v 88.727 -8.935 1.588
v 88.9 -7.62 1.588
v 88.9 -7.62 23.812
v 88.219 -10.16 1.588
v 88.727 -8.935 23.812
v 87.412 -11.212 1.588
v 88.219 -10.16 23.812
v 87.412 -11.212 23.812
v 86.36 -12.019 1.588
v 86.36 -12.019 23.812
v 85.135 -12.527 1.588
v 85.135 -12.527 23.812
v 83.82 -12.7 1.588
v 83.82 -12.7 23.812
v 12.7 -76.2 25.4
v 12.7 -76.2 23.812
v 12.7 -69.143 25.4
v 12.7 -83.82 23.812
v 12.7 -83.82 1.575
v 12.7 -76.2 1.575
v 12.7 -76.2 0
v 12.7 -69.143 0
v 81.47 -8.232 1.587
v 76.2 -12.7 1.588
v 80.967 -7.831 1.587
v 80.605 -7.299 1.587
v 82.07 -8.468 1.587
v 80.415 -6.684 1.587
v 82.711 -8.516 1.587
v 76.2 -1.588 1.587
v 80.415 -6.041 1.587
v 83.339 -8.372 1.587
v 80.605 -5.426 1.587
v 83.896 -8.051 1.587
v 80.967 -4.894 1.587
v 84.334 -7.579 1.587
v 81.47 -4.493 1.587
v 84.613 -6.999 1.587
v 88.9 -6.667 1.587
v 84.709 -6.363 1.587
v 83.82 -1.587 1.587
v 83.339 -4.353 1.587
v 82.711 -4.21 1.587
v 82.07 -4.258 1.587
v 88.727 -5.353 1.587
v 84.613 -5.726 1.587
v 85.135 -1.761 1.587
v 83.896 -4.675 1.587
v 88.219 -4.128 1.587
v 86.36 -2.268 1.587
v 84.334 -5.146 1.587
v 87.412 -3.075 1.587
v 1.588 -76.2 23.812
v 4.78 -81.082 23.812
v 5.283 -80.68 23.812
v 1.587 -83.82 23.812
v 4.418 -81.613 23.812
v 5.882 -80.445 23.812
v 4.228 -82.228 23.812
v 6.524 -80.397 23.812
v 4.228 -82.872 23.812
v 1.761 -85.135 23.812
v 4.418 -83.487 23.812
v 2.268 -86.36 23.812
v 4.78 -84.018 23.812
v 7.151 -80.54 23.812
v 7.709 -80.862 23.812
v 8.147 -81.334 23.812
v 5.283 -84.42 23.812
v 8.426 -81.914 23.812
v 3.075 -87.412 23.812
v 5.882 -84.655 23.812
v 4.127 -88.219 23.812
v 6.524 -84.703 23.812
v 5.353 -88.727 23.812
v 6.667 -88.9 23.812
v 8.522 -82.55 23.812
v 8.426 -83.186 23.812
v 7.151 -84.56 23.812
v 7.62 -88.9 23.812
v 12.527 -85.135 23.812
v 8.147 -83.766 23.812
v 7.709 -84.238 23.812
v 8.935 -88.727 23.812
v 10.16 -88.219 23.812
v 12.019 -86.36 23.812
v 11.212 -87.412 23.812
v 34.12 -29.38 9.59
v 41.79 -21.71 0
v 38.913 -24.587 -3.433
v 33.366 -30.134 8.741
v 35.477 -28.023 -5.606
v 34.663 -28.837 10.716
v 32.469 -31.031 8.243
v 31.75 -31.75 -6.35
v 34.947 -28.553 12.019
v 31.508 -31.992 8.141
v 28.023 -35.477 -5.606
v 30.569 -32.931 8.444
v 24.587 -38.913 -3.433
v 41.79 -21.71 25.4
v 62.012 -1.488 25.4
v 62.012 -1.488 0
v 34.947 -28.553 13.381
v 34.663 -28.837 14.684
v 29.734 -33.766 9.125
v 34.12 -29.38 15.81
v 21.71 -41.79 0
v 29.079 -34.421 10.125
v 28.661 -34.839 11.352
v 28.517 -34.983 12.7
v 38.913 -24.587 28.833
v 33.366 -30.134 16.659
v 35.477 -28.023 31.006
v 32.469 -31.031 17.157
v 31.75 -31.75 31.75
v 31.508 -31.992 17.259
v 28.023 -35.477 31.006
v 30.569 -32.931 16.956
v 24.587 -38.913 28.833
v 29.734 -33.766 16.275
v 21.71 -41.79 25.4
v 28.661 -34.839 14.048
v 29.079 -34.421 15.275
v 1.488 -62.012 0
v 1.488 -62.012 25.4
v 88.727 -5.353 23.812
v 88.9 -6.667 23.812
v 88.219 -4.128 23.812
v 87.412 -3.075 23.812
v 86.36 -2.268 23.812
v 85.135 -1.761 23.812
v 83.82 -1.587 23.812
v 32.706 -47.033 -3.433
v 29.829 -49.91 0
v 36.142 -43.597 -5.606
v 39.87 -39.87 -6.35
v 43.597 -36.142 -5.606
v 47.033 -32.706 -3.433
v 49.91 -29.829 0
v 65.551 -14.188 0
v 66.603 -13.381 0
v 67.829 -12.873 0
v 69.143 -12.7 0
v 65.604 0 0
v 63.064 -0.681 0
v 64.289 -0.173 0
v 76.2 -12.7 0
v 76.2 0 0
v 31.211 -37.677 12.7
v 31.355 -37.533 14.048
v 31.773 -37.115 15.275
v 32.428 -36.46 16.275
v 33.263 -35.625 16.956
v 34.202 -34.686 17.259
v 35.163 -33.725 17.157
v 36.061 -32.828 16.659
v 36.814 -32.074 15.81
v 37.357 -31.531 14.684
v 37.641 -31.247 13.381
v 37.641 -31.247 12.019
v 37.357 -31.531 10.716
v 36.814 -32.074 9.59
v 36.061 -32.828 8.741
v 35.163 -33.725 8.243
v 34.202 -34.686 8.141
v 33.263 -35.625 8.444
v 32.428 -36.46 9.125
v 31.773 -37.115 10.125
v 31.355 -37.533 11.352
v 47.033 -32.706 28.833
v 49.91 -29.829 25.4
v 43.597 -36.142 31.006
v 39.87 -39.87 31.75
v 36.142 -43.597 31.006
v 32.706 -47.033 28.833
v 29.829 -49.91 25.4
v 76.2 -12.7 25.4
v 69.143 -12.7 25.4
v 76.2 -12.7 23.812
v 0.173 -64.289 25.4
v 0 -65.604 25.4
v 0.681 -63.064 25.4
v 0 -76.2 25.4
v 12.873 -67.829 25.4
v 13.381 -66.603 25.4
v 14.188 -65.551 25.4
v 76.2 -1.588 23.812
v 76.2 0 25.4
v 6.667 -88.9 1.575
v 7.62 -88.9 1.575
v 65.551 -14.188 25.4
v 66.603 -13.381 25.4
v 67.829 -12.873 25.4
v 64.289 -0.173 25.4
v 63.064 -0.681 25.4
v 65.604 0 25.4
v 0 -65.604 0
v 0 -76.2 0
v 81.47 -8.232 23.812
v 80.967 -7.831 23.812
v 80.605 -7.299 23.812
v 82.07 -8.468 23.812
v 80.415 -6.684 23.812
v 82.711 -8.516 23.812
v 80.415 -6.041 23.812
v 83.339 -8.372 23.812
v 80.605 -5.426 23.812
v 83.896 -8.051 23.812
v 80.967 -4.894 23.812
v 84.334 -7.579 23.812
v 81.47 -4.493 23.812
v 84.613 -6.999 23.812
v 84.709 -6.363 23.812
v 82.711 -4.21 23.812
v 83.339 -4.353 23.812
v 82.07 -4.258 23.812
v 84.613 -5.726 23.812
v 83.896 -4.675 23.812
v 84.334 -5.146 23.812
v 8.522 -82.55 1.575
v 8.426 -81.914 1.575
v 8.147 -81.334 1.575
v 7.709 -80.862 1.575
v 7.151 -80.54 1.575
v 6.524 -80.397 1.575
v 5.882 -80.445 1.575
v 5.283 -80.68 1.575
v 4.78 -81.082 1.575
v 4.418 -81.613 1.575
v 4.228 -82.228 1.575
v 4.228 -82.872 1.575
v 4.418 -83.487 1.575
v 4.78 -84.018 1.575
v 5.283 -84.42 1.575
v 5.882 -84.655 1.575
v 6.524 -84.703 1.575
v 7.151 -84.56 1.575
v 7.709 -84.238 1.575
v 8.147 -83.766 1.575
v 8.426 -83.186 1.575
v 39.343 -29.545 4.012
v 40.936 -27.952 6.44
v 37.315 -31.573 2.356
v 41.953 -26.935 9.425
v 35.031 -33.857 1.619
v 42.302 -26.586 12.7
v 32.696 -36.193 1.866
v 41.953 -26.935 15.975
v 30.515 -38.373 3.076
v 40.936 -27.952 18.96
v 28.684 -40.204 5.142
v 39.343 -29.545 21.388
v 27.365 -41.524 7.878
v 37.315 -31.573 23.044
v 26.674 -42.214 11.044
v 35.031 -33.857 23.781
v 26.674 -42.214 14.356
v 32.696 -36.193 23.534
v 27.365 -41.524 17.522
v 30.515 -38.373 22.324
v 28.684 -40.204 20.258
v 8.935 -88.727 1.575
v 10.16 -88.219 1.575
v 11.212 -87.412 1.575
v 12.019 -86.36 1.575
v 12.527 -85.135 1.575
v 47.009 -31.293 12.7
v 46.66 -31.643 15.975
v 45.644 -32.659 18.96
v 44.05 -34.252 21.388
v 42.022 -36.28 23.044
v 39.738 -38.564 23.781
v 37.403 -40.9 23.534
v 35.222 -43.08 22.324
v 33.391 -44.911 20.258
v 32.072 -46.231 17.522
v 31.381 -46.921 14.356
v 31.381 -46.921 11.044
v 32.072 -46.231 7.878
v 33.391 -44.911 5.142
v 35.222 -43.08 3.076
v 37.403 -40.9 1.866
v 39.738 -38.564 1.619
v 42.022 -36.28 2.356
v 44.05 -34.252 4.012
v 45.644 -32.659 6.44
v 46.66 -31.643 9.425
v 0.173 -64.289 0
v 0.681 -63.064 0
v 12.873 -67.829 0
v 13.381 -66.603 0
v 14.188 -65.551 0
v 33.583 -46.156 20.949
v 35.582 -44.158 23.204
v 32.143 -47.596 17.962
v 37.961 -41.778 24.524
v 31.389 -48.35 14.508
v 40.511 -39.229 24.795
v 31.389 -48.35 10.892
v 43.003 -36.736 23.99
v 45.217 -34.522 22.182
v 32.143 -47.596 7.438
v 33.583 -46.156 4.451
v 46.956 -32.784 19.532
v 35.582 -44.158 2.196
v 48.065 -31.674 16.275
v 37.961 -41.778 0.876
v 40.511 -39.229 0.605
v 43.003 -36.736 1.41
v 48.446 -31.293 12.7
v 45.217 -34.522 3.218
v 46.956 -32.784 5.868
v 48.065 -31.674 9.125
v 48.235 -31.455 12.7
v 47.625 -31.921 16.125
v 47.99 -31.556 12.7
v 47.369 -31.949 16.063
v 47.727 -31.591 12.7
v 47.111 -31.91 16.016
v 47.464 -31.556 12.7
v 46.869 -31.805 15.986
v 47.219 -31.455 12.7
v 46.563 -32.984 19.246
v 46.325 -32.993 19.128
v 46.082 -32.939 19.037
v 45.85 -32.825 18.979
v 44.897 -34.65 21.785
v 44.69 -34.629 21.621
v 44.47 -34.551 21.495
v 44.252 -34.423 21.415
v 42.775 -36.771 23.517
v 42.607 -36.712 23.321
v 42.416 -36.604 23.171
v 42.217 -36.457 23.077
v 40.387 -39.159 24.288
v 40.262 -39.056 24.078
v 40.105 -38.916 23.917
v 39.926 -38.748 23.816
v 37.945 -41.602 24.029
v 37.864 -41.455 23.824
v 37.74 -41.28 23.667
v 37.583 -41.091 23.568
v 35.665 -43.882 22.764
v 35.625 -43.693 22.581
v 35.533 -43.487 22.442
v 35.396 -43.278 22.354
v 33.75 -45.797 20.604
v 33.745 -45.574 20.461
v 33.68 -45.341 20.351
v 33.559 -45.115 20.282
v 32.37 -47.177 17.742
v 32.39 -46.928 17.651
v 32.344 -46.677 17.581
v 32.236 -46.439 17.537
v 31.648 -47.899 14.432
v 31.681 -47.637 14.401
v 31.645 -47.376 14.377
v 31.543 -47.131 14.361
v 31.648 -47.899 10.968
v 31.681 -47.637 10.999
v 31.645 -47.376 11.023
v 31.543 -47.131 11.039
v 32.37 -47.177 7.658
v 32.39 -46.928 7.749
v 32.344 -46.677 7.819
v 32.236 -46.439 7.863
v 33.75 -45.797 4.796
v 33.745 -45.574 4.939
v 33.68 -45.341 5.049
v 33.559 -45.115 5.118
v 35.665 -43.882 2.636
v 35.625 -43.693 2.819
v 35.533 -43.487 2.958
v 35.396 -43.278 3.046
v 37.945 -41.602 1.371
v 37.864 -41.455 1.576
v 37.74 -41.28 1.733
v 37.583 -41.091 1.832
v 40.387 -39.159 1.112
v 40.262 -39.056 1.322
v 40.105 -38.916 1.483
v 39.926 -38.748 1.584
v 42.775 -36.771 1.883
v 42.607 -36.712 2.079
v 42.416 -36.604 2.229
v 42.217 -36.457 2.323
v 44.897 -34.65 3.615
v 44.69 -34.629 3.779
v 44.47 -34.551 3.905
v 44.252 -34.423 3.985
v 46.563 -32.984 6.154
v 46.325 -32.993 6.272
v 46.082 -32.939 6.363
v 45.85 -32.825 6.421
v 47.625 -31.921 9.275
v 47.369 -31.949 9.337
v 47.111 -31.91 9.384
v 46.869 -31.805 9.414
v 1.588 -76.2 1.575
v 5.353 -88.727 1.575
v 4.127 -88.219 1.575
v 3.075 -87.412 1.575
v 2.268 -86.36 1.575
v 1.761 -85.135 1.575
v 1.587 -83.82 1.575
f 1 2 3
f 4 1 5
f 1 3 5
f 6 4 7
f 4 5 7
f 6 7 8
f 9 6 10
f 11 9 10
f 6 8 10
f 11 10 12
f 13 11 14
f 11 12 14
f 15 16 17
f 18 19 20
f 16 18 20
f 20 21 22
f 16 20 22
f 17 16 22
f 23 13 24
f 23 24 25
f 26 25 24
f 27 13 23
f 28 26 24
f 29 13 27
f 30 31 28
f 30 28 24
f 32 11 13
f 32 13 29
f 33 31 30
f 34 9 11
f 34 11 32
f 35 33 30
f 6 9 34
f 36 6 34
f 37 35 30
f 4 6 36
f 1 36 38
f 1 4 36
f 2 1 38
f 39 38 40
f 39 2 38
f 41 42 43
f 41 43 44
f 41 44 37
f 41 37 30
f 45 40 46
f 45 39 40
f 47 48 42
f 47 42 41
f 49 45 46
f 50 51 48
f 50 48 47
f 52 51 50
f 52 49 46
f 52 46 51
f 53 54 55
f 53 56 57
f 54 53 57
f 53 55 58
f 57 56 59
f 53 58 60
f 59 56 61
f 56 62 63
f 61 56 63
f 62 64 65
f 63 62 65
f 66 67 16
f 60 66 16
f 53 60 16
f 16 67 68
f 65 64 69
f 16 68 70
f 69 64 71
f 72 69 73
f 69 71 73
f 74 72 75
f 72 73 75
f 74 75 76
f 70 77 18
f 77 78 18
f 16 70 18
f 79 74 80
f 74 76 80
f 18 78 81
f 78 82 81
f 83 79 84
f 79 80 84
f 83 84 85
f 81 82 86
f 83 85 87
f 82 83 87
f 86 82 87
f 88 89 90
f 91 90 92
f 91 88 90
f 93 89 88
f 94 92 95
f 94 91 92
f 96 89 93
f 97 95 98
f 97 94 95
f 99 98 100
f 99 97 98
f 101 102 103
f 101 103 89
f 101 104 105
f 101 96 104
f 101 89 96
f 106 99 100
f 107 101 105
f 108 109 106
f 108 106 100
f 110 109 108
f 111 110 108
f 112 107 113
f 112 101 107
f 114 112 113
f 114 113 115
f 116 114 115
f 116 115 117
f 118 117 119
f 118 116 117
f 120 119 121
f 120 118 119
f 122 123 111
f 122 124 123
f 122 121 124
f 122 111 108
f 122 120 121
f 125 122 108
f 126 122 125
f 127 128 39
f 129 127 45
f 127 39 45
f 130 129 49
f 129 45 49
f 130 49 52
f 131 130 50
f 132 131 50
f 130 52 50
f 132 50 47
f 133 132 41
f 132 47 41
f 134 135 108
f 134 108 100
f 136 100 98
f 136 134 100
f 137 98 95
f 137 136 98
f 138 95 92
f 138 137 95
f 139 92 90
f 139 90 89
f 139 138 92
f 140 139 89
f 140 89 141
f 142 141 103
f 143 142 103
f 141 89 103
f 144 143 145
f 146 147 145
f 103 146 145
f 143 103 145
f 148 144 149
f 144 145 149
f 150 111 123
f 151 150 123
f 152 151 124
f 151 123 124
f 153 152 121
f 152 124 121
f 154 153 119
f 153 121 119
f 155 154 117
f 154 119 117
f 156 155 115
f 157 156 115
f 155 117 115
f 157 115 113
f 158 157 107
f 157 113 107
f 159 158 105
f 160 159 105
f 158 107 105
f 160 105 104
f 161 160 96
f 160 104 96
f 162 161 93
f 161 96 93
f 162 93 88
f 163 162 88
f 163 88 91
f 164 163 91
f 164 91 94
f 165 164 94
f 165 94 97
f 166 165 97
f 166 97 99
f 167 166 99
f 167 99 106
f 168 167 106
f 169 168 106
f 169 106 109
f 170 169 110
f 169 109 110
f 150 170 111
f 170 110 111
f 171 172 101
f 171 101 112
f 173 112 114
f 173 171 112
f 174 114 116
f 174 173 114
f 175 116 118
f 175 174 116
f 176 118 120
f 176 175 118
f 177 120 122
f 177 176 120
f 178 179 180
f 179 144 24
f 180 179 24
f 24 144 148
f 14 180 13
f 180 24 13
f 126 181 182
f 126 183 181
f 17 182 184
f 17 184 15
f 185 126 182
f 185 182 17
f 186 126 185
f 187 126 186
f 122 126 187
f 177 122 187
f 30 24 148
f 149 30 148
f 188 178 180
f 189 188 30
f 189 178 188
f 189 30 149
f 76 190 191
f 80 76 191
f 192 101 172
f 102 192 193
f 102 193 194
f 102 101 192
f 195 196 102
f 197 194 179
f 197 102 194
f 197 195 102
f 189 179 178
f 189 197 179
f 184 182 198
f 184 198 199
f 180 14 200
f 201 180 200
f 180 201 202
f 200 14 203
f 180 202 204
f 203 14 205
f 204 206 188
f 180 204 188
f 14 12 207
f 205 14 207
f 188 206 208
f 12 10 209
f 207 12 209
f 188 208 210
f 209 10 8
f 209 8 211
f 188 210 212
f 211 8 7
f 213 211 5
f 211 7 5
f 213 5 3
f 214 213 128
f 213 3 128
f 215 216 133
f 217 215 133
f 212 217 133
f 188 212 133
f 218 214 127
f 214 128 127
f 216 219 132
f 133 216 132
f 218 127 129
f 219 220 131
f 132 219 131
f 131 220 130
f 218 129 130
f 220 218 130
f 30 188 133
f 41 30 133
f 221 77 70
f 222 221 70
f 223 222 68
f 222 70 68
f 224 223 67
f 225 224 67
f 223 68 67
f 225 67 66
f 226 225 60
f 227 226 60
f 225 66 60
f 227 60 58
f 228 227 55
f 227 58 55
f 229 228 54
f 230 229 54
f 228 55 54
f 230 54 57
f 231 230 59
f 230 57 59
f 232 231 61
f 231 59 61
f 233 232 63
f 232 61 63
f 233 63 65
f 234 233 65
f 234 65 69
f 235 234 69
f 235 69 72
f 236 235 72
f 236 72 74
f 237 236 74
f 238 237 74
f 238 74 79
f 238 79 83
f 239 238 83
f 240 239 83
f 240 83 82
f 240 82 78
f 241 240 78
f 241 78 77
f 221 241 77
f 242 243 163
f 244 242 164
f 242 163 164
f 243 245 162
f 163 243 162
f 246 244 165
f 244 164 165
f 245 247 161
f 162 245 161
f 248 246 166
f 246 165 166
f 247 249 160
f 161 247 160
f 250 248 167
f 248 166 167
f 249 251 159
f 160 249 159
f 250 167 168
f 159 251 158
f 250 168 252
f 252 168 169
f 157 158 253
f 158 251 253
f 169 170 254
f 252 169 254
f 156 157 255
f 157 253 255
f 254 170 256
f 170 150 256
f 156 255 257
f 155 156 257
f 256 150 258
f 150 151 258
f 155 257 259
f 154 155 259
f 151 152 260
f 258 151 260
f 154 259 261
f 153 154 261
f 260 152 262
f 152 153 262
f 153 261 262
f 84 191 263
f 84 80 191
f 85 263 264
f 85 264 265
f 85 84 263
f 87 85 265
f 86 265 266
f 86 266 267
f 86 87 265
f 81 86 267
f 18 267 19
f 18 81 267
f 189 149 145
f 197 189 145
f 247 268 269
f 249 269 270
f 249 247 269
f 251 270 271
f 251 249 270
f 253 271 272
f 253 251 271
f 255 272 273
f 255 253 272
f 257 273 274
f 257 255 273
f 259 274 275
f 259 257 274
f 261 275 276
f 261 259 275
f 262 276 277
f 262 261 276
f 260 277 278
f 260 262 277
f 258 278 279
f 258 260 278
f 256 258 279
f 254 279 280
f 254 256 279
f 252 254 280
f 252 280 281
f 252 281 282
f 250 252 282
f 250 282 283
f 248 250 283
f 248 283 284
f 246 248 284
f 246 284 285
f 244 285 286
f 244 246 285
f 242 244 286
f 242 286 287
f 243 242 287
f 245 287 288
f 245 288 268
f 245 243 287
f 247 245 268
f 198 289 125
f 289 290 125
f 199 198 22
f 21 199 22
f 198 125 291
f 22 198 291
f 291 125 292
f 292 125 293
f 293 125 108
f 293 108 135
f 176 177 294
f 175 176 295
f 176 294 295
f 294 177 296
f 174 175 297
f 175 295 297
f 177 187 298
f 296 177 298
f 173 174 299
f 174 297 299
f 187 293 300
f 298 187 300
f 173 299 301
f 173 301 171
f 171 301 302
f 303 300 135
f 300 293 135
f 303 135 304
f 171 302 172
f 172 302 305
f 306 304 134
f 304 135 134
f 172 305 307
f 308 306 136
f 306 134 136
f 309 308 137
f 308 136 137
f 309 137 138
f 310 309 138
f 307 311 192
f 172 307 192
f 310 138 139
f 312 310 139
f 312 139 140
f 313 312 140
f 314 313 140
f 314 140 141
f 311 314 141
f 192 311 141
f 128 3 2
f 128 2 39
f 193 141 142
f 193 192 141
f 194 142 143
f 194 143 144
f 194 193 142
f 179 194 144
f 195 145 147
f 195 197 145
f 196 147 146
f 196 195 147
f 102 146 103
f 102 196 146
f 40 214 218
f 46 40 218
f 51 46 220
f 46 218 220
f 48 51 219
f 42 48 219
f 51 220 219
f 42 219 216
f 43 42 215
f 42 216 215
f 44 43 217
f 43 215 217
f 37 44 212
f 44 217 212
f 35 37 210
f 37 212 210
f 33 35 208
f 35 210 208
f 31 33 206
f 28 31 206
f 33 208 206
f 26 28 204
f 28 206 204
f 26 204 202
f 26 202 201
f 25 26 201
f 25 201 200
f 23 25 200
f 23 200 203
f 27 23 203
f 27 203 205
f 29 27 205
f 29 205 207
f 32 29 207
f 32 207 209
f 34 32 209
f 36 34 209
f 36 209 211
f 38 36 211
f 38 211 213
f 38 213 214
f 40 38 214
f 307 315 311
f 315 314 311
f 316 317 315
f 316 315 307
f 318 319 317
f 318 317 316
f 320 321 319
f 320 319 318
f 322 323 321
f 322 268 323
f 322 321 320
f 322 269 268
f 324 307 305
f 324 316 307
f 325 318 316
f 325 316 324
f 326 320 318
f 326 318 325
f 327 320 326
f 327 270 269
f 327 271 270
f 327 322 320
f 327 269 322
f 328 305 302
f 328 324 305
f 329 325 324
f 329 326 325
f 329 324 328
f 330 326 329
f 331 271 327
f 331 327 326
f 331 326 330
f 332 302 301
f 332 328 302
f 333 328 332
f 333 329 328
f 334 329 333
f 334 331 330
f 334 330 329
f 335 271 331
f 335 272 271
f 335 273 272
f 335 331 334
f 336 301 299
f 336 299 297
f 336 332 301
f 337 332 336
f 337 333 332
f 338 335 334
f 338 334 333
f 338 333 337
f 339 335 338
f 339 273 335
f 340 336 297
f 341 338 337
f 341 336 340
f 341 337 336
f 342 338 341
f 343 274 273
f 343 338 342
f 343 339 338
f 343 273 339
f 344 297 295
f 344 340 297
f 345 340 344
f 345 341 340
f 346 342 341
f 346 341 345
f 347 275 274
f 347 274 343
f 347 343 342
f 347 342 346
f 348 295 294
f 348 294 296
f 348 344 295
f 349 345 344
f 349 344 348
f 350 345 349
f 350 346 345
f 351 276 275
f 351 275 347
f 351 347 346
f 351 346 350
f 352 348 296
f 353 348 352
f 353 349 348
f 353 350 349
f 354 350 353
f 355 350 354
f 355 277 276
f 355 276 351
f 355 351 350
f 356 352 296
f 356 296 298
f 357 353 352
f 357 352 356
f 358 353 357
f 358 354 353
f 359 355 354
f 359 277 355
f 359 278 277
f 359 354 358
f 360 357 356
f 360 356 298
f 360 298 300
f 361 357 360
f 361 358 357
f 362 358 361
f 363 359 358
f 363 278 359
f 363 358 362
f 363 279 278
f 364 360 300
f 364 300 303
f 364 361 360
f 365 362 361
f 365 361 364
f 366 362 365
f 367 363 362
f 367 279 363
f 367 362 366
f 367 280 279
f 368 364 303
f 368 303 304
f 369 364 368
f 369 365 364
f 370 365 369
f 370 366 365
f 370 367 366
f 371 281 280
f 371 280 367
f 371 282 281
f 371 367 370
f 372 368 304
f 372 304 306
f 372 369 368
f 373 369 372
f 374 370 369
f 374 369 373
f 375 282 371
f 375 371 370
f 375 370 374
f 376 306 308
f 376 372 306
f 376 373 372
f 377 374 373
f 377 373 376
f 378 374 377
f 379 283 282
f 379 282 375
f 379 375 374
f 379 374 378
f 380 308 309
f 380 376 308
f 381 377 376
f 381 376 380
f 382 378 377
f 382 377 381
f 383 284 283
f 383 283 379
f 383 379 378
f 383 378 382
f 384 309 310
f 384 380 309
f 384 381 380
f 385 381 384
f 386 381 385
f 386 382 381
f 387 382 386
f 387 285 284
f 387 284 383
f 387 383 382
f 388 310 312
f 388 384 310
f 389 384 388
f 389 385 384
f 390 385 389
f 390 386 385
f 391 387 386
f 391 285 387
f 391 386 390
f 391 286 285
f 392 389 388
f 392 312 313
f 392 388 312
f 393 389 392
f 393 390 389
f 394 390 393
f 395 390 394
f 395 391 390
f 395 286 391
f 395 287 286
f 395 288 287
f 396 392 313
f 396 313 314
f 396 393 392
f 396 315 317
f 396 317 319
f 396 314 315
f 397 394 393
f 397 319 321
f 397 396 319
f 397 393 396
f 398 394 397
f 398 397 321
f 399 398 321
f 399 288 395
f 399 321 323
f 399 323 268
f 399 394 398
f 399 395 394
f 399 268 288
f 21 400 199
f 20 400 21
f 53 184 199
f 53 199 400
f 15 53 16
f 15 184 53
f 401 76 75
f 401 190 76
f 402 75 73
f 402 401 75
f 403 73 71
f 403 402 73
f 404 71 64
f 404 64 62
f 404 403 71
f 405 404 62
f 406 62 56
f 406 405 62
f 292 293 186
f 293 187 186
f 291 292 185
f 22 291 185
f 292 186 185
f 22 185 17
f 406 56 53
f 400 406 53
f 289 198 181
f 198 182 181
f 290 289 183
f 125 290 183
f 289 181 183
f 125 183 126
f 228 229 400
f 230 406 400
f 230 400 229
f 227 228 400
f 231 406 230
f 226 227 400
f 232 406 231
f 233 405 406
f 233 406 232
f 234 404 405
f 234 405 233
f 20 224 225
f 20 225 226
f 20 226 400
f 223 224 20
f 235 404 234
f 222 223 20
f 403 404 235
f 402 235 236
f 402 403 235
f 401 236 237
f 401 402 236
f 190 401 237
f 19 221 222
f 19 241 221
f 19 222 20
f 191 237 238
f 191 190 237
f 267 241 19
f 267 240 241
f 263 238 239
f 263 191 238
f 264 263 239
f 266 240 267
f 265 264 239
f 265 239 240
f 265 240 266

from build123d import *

# Parameters (mm, degrees)
BOSS_EXTRUDE1_DEPTH    = 25.4
SKETCH2_R              = 2.159
SKETCH2_W              = 12.7
SKETCH2_H              = 1.5875
SKETCH2_W_2            = 1.5875
SKETCH2_H_2            = 12.7
CUT_EXTRUDE1_DEPTH     = 25.4
SKETCH3_W              = 12.7
SKETCH3_H              = 1.5875
SKETCH3_H_2            = 1.5748
CUT_EXTRUDE2_DEPTH     = 12.7
SKETCH4_W              = 1.5875
SKETCH4_H              = 12.7
CUT_EXTRUDE3_DEPTH     = 12.7
F_3DSKETCH1_R          = 19.05
F_3DSKETCH1_R_2        = 11.1125
BOSS_EXTRUDE2_DEPTH    = 11.482870812
CUT_EXTRUDE4_START     = 44.901280605
CUT_EXTRUDE4_OUTLINE_R = 11.1125
CUT_EXTRUDE4_DEPTH     = 11.482870812
SKETCH5_R              = 11.1125
SKETCH5_R_2            = 4.572
BOSS_EXTRUDE3_DEPTH    = 3.81
FILLET1_R              = 5.08
FILLET2_R              = 1.016


# Read off the part's stored shape, not the designer's step: Cut-Extrude4
with BuildPart() as part:
    # Sketch1 → Boss-Extrude1 (new body)
    with BuildSketch(Plane.XY):
        Polygon((88.9, 0), (63.5, 0), (0, -63.5), (0, -88.9), (12.7, -88.9), (12.7, -67.039231637), (67.039231637, -12.7), (88.9, -12.7), align=None)
    extrude(amount=BOSS_EXTRUDE1_DEPTH)

    # Sketch2 → Cut-Extrude1 (cut)
    with BuildSketch(Plane.XY.offset(25.4)):
        with Locations((82.55, -6.3627)):
            Circle(SKETCH2_R)
        with Locations((6.3627, -82.55)):
            Circle(SKETCH2_R)
        with Locations((82.55, -0.79375)):
            Rectangle(SKETCH2_W, SKETCH2_H)
        with Locations((0.79375, -82.55)):
            Rectangle(SKETCH2_W_2, SKETCH2_H_2)
    extrude(amount=-CUT_EXTRUDE1_DEPTH, mode=Mode.SUBTRACT)

    # Sketch3 → Cut-Extrude2 (cut)
    with BuildSketch(Plane.XZ.offset(88.9)):
        with Locations((6.35, 24.60625)):
            Rectangle(SKETCH3_W, SKETCH3_H)
        with Locations((6.35, 0.7874)):
            Rectangle(SKETCH3_W, SKETCH3_H_2)
    extrude(amount=-CUT_EXTRUDE2_DEPTH, mode=Mode.SUBTRACT)

    # Sketch4 → Cut-Extrude3 (cut)
    with BuildSketch(Plane(origin=(88.9, 0, 0), x_dir=(0, 0, -1), z_dir=(1, 0, 0))):
        with Locations((-0.79375, -6.35)):
            Rectangle(SKETCH4_W, SKETCH4_H)
        with Locations((-24.60625, -6.35)):
            Rectangle(SKETCH4_W, SKETCH4_H)
    extrude(amount=-CUT_EXTRUDE3_DEPTH, mode=Mode.SUBTRACT)

    # 3DSketch1 → Boss-Extrude2 (add)
    with BuildSketch(Plane(origin=(67.039231637, -12.7, 0), x_dir=(-0.6713837490692134, -0.6713837490692195, 0.3138275369873187), z_dir=(0.7071067811865508, -0.7071067811865444, 0))):
        with Locations((40.468086778, 0)):
            Circle(F_3DSKETCH1_R)
        with Locations((40.468086778, 0)):
            Circle(F_3DSKETCH1_R_2, mode=Mode.SUBTRACT)
    extrude(amount=-BOSS_EXTRUDE2_DEPTH)

    # Cut-Extrude4 outline → Cut-Extrude4 (cut)
    with BuildSketch(Plane(origin=(0, 0, 0), x_dir=(0.7071067811865438, 0.7071067811865512, 0), z_dir=(0.7071067811865511, -0.7071067811865441, 0)).offset(CUT_EXTRUDE4_START)):
        with Locations((0, 12.7)):
            Circle(CUT_EXTRUDE4_OUTLINE_R)
    extrude(amount=CUT_EXTRUDE4_DEPTH, mode=Mode.SUBTRACT)

    # Sketch5 → Boss-Extrude3 (add)
    with BuildSketch(Plane(origin=(31.75, -31.75, 0), x_dir=(0, 0, 1), z_dir=(-0.7071067811865476, 0.7071067811865475, 0))):
        with Locations(Location((12.7, 0, 0), (0, 0, 270))):
            Circle(SKETCH5_R)
        with Locations(Location((12.7, 0, 0), (0, 0, 270))):
            Circle(SKETCH5_R_2, mode=Mode.SUBTRACT)
    extrude(amount=-BOSS_EXTRUDE3_DEPTH)

    # Fillet1
    fillet1_edges = [part.edges().sort_by_distance(p)[0] for p in [
        (88.9, -1.5875, 12.7),
        (88.9, -12.7, 12.7),
        (63.5, 0, 12.7),
        (67.039231637, -12.7, 12.7),
        (12.7, -67.039231637, 12.7),
        (0, -63.5, 12.7),
        (1.5875, -88.9, 12.69365),
        (12.7, -88.9, 12.69365),
    ]]
    fillet(fillet1_edges, radius=FILLET1_R)

    # Fillet2
    fillet2_edges = [part.edges().sort_by_distance(p)[0] for p in [
        (32.011891712, -47.727339924, 12.7),
    ]]
    fillet(fillet2_edges, radius=FILLET2_R)


solid = part.part
